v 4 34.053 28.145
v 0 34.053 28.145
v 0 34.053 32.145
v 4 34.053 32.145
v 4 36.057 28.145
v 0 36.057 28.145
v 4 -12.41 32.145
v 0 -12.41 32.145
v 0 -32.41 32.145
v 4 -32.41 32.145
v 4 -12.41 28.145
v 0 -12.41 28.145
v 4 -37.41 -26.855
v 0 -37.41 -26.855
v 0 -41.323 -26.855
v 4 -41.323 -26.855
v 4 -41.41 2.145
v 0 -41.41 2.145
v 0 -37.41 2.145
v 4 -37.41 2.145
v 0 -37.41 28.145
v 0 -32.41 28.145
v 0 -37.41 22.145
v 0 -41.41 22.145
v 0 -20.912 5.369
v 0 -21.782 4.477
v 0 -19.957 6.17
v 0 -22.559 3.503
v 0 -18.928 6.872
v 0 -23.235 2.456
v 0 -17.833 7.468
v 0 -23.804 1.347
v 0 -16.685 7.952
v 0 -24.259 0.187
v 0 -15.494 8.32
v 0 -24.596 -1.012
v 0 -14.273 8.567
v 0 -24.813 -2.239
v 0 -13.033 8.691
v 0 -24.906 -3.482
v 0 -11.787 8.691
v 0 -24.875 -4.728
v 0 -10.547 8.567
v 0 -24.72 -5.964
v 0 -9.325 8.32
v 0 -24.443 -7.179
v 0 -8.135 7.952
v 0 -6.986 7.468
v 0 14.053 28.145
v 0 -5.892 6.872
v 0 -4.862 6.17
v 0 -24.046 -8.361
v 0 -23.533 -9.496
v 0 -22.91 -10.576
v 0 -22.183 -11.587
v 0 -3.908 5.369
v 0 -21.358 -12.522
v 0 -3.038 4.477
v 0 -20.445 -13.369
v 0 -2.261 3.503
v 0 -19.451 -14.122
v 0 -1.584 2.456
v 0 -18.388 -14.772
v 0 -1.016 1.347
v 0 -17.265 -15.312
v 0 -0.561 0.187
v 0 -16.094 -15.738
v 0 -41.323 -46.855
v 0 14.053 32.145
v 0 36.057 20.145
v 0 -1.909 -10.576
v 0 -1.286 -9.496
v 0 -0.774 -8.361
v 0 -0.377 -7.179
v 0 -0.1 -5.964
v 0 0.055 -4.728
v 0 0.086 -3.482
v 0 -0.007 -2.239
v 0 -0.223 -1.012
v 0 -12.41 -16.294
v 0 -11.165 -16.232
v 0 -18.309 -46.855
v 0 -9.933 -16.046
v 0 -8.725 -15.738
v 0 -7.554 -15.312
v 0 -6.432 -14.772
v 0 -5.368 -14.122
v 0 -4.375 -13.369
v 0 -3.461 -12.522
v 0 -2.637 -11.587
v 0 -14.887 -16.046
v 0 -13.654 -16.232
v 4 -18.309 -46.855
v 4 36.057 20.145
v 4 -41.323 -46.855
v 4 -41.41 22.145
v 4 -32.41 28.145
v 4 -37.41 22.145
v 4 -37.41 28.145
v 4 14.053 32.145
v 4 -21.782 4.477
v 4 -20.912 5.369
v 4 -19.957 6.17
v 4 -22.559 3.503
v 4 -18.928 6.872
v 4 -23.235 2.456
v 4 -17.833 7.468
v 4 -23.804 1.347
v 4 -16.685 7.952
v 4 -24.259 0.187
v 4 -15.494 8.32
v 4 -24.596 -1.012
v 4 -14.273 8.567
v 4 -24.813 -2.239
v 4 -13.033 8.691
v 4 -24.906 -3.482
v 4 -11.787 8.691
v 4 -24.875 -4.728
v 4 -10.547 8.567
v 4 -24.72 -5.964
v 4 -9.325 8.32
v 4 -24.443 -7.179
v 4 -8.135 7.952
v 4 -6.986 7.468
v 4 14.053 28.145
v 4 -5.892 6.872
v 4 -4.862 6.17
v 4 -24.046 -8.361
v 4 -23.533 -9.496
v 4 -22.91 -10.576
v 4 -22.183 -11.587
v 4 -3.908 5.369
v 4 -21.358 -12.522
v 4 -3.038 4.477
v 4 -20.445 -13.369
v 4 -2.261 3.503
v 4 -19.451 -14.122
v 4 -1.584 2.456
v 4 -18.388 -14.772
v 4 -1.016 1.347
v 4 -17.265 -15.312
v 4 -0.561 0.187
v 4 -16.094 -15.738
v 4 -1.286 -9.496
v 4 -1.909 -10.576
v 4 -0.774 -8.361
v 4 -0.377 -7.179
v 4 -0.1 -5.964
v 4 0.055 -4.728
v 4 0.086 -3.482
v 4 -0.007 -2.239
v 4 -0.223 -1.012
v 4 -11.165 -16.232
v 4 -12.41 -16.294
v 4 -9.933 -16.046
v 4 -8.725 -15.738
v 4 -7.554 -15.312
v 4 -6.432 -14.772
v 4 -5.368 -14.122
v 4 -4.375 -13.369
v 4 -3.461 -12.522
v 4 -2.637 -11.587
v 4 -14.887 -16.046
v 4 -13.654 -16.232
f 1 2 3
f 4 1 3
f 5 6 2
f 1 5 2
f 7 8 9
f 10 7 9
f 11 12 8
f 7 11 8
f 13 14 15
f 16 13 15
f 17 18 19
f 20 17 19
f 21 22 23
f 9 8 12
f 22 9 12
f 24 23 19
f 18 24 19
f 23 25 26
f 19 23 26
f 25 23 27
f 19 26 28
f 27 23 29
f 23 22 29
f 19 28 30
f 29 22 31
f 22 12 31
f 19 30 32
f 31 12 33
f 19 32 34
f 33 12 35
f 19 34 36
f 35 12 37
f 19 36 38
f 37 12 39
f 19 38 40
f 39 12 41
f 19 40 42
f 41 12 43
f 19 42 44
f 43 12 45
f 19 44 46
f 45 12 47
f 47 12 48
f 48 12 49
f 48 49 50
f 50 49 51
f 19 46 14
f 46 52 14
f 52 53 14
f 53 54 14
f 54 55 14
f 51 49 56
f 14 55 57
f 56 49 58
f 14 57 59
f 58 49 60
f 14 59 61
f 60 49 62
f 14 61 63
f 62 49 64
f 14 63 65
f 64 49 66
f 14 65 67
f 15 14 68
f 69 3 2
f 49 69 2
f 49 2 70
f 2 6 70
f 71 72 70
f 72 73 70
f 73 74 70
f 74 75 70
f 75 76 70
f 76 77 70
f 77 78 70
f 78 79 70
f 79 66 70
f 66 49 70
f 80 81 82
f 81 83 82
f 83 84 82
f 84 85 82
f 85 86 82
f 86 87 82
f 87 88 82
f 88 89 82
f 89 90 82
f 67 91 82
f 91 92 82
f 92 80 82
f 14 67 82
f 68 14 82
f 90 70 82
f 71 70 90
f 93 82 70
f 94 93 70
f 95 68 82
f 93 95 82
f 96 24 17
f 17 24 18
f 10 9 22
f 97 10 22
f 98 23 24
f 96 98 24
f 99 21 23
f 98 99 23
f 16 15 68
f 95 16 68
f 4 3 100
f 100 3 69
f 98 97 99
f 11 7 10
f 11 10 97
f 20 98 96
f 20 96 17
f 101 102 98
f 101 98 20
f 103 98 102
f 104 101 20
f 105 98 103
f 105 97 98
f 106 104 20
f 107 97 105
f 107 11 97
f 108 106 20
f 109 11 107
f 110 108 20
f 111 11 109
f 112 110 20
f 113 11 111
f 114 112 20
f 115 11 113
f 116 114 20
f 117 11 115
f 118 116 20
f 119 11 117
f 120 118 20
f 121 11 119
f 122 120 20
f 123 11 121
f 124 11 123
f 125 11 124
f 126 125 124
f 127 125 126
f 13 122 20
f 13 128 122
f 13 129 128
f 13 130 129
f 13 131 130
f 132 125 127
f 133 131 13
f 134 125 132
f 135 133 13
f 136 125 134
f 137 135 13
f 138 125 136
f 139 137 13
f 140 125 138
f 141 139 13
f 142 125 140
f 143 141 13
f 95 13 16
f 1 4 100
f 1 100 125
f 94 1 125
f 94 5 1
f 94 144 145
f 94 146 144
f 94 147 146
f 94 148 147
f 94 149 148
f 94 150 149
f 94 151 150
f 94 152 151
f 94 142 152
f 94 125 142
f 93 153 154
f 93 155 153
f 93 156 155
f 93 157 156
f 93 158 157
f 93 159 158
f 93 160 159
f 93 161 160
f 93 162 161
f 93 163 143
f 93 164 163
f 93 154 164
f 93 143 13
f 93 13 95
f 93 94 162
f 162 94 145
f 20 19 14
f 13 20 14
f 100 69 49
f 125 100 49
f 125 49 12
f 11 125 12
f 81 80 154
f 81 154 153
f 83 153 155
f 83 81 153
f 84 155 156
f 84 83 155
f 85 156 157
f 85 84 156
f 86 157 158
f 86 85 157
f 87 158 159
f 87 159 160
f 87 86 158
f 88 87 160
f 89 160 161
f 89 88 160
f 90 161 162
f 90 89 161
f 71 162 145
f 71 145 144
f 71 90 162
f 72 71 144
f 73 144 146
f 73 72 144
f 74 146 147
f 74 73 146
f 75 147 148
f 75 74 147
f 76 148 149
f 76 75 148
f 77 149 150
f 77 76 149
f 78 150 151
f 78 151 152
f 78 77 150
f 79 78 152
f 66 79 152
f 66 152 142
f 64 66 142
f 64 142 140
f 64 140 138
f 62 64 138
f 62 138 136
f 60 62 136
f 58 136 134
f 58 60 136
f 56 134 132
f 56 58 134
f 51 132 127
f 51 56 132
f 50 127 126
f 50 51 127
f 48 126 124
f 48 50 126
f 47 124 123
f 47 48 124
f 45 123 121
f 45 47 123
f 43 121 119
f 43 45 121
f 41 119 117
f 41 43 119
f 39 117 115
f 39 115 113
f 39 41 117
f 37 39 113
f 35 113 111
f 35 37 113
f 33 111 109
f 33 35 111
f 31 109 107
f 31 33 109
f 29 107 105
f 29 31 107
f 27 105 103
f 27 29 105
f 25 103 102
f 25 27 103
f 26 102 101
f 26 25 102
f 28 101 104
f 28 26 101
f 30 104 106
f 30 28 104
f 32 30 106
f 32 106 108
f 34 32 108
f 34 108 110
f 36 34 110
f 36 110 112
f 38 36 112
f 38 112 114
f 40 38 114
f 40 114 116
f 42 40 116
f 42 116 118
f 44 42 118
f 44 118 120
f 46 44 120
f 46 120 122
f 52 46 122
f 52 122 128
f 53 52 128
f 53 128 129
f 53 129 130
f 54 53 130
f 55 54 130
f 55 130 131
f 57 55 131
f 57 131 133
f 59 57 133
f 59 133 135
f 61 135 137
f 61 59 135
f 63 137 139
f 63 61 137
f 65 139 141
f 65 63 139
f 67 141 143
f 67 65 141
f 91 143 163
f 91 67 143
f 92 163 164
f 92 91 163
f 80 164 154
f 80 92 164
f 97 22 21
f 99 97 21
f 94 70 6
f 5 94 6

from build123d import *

# Parameters (mm, degrees)
SKETCH1_R           = 12.5
BOSS_EXTRUDE1_DEPTH = 4


with BuildPart() as part:
    # Sketch1 → Boss-Extrude1 (new body)
    with BuildSketch(Plane(origin=(0, 0, 0), x_dir=(0, 0, -1), z_dir=(1, 0, 0))):
        Polygon((-32.145071831, 34.052951323), (-32.145071831, 14.052951323), (-28.145071831, 14.052951323), (-28.145071831, -12.409790693), (-32.145071831, -12.409790693), (-32.145071831, -32.409790693), (-28.145071831, -32.409790693), (-28.145071831, -37.409790693), (-22.145071831, -37.409790693), (-22.145071831, -41.409790693), (-2.145071831, -41.409790693), (-2.145071831, -37.409790693), (26.854928169, -37.409790693), (26.854928169, -41.322671818), (46.854928169, -41.322671818), (46.854928169, -18.308632295), (-20.145071831, 36.057032999), (-28.145071831, 36.057032999), (-28.145071831, 34.052951323), align=None)
        with Locations((3.793770472, -12.409790693)):
            Circle(SKETCH1_R, mode=Mode.SUBTRACT)
    extrude(amount=BOSS_EXTRUDE1_DEPTH)


solid = part.part
